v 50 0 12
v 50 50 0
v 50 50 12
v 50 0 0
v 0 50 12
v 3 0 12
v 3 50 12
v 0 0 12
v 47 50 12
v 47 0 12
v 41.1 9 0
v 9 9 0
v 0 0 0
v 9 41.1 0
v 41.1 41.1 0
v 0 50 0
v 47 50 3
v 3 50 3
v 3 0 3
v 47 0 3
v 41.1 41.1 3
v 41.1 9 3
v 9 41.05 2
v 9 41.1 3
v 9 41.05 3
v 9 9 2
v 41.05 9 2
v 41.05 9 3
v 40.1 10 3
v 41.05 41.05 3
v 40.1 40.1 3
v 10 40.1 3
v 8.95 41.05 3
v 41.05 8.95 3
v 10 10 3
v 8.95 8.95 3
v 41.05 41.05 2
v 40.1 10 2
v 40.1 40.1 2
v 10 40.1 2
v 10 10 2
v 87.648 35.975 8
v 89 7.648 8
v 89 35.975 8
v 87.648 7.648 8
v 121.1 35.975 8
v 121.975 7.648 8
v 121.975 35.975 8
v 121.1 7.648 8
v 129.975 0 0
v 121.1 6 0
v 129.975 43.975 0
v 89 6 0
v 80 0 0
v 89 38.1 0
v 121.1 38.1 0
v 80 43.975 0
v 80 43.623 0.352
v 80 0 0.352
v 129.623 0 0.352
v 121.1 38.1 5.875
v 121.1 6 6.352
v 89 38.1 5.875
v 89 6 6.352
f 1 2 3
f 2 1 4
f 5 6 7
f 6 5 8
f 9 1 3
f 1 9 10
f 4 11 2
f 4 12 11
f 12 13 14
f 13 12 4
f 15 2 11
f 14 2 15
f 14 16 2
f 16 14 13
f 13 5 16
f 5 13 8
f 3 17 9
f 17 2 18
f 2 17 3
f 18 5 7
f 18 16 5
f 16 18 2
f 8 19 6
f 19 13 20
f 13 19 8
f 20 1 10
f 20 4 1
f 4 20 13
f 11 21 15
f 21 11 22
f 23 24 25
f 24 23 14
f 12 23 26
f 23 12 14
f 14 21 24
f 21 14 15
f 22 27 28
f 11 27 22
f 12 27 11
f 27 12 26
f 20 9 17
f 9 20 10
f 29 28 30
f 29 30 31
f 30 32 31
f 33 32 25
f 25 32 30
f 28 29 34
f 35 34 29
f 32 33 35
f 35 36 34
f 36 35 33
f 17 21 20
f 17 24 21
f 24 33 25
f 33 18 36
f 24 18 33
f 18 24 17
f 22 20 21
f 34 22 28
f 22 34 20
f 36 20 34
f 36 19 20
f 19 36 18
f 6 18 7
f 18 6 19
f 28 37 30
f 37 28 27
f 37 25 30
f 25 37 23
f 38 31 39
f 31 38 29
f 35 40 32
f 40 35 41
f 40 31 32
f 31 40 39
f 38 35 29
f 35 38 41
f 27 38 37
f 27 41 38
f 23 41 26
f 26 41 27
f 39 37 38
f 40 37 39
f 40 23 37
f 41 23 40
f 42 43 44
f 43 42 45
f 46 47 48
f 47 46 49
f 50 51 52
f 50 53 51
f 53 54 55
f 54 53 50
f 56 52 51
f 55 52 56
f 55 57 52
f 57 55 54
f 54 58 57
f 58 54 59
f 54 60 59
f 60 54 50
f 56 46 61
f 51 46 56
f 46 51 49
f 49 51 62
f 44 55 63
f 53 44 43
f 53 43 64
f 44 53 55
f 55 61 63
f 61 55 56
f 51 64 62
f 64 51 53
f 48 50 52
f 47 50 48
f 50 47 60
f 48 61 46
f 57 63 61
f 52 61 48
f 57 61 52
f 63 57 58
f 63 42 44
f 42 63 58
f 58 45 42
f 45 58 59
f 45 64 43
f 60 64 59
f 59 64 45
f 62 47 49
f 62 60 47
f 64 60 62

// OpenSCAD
// What kind of block are you using?
block_type = 0; // [0:Cube,2:Cylinder]

// The width or diameter of the block
block_width = 32; // [0.5:0.5:100]

// The length of the block
block_length = 32; // [0.5:0.5:100]

// Tolerance to use
block_tolerance = .1; // [0.1:0.1:0.9]

module block(height=40, shrink=0) {
    if (block_type == 0) {
        cube([block_width+block_tolerance-shrink, block_length+block_tolerance-shrink, height]);
    } else {
        translate([block_width/2, block_width/2]) cylinder(d=block_width+block_tolerance-shrink, h=height, center=false);
    }
}

module base(base_x=50, base_y=50, base_height=8, cut=1) {
    difference() {
        difference() {
            cube([base_x, base_y, base_height]);
            translate([(base_x/2) - (block_width/2), (base_y/2) - (block_width/2), 0]) block();
        }
        if (cut == 1) {
            translate([(base_x-(hole_x/4)), 0, base_height]) rotate([0, 45, 0]) cube([hole_x/2, base_x+10, hole_x/2]);
            translate([base_x, base_y-(hole_x/4), base_height]) rotate([0, 45, 90]) cube([hole_x/2, base_x+10, hole_x/2]);
            translate([(-1*(hole_x/2))+1, 0, base_height]) rotate([0, 45, 0]) cube([hole_x/2, base_x+10, hole_x/2]);
            translate([base_x, (-1*(hole_y/2))+1, base_height]) rotate([0, 45, 90]) cube([hole_x/2, base_x+10, hole_x/2]);
        }
    }
}

module rail_top(base_x=50, base_y=50, hole_x=32, hole_y=32, rail_width=44, height=12) {
    under_rail_height = ((base_x/2)-(rail_width/2));
    difference() {
        base(base_x, base_y, hole_x, hole_y, base_height=height, cut=0);
        translate([(base_x/2)-(rail_width/2), 0, under_rail_height]) cube([rail_width, base_y, height]);
    }
    difference() {
        translate([(base_x/2) - (hole_x/2), (base_y/2) - (hole_y/2), 0]) block(height=under_rail_height);
        translate([(base_x/2) - ((block_width+block_type)/2) + 1, (base_y/2) + 1 - ((block_length+block_type)/2), 0]) block(height=under_rail_height, shrink=2);
        translate([(base_x/2) - (hole_x/2), (base_y/2) - (hole_y/2), 0]) block(height=under_rail_height/1.5);
    }
}

module render_assembled() {
    translate([-3, 0, 61]) rail_top();
    translate([0, 0, 0]) base(base_x=44);
    translate([6, 9, 0]) cube([32, 32, 64]);
}

module render_printable() {
    translate([0, 0, 0]) rail_top(hole_x=32.1, hole_y=32.1);
    translate([80, 0, 0]) base(base_y=44, hole_x=32.1, hole_y=32.1);
}

render_printable();
//render_assembled();
//block();
